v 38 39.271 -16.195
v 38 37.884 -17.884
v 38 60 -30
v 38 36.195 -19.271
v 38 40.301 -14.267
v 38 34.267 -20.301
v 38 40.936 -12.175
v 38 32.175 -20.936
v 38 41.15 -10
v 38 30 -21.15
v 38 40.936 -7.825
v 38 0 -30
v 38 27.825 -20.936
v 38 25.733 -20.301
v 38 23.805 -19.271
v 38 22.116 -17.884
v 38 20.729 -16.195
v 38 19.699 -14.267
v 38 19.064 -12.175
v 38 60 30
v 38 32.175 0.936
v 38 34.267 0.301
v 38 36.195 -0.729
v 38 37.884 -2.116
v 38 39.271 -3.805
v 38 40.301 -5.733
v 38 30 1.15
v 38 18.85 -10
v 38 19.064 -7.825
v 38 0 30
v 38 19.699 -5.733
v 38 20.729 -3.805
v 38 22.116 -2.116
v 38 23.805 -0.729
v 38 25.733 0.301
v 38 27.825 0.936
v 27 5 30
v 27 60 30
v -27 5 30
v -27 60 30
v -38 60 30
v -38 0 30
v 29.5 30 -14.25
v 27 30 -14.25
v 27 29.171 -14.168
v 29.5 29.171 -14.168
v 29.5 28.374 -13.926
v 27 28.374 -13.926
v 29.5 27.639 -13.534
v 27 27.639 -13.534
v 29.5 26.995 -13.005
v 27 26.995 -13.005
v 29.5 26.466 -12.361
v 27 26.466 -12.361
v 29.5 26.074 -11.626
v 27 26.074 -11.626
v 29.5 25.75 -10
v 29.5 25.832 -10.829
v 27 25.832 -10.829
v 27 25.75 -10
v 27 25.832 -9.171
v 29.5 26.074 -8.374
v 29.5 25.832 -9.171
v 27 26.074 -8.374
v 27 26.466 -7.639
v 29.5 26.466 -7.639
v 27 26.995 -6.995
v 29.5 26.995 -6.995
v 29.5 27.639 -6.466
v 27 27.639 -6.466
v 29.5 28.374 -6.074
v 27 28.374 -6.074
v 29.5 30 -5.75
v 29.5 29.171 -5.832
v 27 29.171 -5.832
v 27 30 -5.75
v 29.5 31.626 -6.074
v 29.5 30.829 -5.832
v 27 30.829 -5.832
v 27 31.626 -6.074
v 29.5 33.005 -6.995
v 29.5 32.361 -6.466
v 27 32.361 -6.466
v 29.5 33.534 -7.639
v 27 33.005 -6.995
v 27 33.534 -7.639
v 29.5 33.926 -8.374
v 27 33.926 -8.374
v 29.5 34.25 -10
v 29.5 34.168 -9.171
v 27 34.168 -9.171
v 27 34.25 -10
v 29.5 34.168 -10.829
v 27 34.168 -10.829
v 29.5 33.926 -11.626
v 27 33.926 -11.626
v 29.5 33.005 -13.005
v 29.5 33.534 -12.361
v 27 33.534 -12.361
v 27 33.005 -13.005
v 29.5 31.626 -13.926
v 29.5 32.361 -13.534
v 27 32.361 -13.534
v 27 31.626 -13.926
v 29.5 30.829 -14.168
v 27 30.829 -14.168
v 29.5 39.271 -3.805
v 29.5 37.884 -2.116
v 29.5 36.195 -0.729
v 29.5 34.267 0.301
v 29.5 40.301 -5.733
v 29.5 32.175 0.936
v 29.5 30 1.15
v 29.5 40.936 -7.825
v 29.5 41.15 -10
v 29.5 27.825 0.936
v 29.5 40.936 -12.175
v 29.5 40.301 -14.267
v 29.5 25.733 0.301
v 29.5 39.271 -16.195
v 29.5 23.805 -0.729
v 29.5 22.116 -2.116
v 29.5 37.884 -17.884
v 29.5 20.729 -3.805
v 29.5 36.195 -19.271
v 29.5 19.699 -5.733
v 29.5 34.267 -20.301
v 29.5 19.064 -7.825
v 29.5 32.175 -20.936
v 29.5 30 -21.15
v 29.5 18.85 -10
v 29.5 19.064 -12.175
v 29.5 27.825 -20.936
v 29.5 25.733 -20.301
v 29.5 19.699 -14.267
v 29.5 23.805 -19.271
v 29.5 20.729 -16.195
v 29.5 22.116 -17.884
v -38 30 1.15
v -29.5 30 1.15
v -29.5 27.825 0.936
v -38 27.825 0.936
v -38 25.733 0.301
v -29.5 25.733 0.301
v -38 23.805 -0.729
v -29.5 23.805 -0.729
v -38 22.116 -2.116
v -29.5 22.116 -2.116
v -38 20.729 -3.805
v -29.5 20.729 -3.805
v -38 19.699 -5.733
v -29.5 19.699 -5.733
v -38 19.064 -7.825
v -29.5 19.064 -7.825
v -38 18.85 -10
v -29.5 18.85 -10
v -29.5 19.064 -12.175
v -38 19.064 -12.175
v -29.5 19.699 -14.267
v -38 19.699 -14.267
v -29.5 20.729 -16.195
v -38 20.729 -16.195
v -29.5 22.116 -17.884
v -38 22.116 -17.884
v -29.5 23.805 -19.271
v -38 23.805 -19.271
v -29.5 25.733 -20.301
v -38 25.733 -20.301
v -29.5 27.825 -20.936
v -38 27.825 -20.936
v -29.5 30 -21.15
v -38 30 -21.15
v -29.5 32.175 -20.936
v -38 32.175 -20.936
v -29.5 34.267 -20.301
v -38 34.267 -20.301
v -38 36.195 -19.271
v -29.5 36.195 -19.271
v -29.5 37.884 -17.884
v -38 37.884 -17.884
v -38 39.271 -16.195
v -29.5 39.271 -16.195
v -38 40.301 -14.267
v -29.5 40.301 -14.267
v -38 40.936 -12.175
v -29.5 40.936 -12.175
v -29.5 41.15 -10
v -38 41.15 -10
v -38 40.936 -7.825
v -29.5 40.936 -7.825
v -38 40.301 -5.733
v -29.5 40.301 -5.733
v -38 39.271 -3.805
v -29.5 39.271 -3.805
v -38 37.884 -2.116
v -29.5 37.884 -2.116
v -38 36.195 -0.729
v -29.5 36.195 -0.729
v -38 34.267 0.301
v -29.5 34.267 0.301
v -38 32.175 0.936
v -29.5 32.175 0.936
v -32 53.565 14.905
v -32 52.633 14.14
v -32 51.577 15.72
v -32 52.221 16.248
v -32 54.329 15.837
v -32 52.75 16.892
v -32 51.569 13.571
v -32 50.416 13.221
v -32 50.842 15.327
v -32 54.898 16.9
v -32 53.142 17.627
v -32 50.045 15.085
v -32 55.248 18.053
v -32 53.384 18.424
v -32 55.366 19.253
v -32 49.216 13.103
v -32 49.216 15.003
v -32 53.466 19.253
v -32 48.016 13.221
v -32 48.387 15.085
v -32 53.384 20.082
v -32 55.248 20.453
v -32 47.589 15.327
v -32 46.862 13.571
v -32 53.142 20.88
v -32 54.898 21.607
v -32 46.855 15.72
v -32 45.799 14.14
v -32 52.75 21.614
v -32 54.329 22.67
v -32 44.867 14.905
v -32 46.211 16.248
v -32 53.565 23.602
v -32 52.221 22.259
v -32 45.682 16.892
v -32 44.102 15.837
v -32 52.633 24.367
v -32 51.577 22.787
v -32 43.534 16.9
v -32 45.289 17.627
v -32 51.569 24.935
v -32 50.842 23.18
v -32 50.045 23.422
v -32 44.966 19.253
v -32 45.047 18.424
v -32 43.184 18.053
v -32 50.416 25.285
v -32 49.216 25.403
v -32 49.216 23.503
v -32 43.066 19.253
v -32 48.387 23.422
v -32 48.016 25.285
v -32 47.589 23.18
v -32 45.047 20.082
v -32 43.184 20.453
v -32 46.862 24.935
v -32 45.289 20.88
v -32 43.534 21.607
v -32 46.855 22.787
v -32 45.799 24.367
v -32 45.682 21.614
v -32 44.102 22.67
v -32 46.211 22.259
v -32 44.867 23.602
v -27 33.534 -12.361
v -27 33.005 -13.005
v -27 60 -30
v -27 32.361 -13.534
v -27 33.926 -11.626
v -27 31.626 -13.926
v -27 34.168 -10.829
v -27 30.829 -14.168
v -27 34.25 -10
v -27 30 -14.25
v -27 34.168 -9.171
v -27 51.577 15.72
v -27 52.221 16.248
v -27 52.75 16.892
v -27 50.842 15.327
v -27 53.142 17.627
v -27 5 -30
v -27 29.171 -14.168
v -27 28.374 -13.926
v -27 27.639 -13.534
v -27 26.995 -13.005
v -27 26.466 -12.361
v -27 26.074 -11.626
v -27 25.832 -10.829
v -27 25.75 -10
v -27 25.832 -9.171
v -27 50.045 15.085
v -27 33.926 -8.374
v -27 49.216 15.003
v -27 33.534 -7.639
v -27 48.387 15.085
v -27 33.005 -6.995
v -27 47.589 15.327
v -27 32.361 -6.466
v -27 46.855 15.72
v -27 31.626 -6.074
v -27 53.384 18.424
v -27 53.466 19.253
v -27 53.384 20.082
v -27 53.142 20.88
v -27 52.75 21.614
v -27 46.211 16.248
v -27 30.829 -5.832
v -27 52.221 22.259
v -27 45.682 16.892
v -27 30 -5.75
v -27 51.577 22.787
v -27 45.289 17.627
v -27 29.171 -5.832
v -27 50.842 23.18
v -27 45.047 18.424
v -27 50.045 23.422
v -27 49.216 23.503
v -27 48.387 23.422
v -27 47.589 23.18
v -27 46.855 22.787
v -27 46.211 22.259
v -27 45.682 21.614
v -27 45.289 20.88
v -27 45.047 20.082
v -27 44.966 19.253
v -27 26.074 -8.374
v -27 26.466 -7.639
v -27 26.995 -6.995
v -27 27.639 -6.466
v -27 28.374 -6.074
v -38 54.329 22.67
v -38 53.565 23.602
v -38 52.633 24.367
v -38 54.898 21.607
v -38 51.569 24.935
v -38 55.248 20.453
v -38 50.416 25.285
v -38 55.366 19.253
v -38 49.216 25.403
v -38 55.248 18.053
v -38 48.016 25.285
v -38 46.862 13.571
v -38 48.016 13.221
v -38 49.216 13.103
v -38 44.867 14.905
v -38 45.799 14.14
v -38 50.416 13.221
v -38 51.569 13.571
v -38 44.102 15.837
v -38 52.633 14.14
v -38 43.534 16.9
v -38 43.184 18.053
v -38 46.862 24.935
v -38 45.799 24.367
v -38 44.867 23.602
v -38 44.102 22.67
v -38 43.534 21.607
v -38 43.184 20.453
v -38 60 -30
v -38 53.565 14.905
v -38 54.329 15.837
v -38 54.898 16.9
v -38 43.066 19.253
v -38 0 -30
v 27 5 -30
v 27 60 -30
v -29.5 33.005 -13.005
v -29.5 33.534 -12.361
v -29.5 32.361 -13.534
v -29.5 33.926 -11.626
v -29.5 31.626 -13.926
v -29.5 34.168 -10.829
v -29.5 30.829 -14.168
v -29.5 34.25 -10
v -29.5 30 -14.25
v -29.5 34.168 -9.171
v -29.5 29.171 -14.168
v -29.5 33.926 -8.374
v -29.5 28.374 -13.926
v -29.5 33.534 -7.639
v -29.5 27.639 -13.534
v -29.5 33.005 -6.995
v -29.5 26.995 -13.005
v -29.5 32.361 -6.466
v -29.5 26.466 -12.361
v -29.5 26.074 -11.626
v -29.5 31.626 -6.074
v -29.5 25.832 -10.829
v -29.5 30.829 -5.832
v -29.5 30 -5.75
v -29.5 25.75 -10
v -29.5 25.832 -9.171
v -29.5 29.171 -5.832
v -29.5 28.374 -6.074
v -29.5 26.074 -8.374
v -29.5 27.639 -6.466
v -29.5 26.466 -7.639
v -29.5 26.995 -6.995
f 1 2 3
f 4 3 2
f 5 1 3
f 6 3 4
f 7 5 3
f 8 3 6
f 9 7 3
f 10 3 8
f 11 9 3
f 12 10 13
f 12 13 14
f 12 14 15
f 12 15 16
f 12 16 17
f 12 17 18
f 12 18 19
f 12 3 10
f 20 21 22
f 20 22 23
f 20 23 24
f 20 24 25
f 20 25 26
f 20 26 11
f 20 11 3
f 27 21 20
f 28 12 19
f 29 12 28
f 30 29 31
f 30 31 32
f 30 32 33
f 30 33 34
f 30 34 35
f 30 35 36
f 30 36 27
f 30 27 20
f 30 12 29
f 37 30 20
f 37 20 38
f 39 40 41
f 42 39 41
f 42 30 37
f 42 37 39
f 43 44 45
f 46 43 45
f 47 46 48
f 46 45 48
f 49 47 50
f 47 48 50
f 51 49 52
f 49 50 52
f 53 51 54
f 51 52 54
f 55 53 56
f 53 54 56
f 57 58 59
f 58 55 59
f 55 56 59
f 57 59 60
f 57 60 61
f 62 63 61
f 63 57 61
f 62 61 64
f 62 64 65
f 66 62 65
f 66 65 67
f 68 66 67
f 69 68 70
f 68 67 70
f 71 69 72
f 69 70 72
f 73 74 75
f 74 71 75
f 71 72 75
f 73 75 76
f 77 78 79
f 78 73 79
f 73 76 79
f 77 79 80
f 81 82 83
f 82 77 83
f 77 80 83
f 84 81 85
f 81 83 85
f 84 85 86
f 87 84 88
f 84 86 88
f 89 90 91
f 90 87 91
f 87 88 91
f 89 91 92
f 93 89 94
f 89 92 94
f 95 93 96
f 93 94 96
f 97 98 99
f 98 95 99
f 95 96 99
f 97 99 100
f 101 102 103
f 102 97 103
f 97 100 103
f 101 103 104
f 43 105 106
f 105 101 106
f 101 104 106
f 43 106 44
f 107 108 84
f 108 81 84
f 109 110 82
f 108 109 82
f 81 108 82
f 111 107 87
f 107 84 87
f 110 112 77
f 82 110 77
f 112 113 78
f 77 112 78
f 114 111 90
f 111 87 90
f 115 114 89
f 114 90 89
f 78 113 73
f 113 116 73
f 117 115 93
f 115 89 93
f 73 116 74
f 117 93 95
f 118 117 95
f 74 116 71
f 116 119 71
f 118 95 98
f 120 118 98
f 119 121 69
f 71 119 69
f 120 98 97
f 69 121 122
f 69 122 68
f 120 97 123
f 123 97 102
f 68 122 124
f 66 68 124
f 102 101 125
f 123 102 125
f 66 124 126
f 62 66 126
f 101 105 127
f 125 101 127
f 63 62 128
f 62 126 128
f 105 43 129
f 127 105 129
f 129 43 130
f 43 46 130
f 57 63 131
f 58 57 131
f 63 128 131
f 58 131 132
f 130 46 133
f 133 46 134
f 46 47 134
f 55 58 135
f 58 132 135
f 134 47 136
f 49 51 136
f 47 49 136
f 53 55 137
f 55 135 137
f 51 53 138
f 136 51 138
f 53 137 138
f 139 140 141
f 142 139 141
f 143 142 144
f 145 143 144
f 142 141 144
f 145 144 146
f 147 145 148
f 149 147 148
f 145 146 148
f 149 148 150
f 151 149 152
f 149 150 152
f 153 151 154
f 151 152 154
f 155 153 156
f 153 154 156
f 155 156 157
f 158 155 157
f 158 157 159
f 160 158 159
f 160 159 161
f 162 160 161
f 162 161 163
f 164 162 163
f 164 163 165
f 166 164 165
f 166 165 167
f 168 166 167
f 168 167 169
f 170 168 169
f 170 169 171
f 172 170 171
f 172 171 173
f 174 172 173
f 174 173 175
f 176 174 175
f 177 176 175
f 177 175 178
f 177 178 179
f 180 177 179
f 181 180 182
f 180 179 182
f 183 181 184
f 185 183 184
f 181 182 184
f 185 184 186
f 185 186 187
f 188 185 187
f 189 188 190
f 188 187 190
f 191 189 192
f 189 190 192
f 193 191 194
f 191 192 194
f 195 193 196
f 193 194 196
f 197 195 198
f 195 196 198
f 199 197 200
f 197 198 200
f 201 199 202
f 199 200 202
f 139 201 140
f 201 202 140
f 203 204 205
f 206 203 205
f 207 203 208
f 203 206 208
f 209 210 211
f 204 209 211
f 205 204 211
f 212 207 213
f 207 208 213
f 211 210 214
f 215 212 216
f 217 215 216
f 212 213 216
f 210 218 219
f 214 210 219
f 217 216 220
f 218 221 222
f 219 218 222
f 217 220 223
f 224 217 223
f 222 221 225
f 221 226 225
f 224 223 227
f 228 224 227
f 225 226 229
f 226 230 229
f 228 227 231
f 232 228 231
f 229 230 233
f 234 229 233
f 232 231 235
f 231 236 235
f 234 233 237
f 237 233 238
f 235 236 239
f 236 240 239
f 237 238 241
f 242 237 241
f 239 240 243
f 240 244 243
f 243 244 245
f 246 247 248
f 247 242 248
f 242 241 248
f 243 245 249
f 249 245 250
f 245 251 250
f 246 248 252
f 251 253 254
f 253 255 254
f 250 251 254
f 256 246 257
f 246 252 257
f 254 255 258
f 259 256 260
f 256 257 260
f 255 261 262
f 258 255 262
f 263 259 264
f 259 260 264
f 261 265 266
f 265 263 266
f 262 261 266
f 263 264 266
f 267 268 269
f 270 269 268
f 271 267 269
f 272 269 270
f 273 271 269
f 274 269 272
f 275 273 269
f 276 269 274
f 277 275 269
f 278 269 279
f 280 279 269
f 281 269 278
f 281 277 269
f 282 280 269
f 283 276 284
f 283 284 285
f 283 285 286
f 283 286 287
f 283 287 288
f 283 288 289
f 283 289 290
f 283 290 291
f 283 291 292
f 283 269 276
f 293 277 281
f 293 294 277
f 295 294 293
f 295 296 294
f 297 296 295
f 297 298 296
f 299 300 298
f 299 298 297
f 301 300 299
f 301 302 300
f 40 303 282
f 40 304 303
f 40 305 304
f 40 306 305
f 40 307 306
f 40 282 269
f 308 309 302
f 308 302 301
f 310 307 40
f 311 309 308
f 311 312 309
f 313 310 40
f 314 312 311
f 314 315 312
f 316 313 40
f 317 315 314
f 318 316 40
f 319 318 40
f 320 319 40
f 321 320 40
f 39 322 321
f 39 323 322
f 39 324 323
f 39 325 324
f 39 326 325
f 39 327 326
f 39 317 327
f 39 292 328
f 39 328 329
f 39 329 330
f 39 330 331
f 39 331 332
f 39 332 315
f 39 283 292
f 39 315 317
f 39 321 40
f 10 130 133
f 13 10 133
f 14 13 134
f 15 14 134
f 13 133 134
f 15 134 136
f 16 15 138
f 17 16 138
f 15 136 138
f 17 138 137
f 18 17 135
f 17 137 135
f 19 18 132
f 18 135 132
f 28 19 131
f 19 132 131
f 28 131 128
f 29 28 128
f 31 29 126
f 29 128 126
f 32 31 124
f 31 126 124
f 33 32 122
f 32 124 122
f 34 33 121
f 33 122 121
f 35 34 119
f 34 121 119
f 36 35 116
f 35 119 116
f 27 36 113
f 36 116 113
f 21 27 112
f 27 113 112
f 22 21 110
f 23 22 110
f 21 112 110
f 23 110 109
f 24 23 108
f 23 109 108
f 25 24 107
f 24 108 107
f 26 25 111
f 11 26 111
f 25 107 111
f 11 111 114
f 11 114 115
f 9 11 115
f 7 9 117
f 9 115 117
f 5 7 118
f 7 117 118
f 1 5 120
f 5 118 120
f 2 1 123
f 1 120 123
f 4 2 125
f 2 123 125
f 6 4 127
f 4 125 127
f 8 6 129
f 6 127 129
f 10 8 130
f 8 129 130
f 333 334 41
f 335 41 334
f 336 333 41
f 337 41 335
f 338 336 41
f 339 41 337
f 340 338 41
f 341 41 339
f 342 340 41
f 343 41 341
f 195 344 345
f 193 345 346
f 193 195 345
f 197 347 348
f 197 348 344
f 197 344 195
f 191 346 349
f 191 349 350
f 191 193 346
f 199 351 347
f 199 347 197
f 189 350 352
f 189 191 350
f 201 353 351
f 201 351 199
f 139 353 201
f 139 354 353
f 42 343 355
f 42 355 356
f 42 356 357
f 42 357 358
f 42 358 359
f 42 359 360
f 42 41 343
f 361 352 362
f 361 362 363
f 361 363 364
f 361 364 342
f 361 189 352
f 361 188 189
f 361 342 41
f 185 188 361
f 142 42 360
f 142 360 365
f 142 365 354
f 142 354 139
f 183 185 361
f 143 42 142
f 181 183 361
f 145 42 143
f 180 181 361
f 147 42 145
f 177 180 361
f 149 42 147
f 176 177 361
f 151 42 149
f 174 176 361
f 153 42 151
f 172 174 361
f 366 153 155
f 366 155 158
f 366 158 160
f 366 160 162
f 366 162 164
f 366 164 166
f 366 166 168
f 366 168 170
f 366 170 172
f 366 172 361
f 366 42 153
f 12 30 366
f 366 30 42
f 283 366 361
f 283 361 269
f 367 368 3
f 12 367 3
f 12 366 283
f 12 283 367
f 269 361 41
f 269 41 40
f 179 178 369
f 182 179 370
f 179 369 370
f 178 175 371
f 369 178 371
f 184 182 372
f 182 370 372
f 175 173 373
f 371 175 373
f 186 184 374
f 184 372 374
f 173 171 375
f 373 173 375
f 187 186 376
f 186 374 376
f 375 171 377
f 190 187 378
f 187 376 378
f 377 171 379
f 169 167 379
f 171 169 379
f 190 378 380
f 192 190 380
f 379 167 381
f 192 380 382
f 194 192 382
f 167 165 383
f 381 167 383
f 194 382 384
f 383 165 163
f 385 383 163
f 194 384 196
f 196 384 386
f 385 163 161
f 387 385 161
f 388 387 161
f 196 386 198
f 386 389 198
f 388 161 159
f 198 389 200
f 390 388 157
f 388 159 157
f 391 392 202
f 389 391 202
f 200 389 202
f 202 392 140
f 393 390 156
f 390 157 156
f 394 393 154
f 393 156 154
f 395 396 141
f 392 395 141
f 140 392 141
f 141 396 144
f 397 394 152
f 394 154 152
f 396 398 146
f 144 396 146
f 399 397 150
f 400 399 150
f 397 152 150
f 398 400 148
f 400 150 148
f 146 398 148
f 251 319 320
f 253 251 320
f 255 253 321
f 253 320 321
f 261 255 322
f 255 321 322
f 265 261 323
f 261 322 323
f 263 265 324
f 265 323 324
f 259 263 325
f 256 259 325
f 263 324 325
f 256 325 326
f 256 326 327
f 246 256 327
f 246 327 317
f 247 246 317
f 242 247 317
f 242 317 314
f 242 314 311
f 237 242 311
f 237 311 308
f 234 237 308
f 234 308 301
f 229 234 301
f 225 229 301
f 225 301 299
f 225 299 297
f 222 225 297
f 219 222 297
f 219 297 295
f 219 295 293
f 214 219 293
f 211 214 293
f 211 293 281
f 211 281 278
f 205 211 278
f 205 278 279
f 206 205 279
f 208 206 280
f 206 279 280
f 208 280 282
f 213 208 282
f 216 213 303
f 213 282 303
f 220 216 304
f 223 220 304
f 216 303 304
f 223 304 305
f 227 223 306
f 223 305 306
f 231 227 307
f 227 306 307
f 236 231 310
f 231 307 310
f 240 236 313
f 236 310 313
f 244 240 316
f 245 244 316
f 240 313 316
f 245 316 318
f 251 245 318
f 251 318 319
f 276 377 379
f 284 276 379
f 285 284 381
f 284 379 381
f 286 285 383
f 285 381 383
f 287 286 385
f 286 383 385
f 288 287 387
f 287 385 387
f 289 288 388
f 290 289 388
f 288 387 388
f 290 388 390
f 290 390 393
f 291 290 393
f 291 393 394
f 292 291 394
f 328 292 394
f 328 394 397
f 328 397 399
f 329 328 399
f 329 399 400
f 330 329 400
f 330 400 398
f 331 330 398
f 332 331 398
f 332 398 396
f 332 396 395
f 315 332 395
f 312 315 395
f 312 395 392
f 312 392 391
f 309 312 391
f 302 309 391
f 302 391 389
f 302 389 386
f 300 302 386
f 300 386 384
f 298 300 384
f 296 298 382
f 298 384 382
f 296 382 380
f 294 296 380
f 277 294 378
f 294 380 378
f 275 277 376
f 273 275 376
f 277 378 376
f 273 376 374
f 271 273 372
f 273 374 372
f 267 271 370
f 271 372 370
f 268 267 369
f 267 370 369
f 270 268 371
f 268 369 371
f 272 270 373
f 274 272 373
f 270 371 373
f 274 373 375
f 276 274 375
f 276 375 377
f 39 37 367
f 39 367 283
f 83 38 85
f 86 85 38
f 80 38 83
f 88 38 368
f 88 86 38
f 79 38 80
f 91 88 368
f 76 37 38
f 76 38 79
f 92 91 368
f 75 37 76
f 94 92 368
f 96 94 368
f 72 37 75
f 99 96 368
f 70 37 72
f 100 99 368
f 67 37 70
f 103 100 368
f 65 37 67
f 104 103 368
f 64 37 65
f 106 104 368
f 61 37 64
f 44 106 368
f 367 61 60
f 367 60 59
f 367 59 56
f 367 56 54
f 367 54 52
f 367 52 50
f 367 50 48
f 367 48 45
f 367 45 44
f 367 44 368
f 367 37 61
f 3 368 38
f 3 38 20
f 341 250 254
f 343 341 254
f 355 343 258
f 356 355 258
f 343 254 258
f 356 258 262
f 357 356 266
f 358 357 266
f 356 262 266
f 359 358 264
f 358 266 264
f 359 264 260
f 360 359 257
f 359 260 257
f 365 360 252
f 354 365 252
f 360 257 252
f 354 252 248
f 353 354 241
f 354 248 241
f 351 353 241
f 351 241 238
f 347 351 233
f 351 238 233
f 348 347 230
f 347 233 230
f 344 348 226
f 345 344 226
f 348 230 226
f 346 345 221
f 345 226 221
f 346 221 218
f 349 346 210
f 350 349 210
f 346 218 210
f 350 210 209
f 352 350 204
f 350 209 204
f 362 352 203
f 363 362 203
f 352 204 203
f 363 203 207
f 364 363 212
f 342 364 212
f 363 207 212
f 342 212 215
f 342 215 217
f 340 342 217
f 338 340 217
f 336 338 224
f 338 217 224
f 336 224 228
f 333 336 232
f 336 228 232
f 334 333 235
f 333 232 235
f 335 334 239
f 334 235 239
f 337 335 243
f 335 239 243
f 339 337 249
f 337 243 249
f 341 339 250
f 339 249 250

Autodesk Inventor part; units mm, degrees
ref_plane "YZ Plane" through (0, 0, 0) normal (1, 0, 0) x (0, 1, 0)
ref_plane "XZ Plane" through (0, 0, 0) normal (0, 1, 0) x (-1, 0, 0)
ref_plane "XY Plane" through (0, 0, 0) normal (0, 0, 1) x (1, 0, 0)
sketch "草圖1" plane through (0, 0, 0) normal (0, 1, 0) x (-1, 0, 0)
  line L0 (-38, 30) -> (38, 30)
  line L1 (38, 30) -> (38, -30)
  line L2 (38, -30) -> (-38, -30)
  line L3 (-38, -30) -> (-38, 30)
  point P0 (0, 0)
  point P1 (0, -30)
  point P2 (38, 0)
  dimension "d0" = 60
  dimension "d1" = 76
extrude "擠出1" add sketch "草圖1" along normal blind 5
sketch "草圖2" plane through (0, 5, 0) normal (0, 1, 0) x (1, 0, 0)
  line L0 (38, 30) -> (-38, 30) projected
  line L1 (-38, 30) -> (-38, -30) projected
  line L2 (-38, -30) -> (38, -30) projected
  line L3 (38, -30) -> (38, 30) projected
  line L4 (-27, 30) -> (-27, -30)
  line L5 (27, -30) -> (27, 30)
  point P0 (0, 0)
  dimension "d4" = 11
  dimension "d5" = 11
extrude "擠出2" add sketch "草圖2" along normal blind 55 contours L3 L2 L5 L0 | L4 L2 L1 L0
sketch "草圖3" plane through (38, 0, 30) normal (1, 0, 0) x (0, 0, -1)
  line L0 (60, 0) -> (60, 60) projected
  line L1 (0, 5) -> (60, 5) projected
  circle A0 centre (40, 30) radius 11.2
  line L2 (10.7467, 49.2158) -> (40, 30)
  point P0 (30, 0)
  dimension "d8" = 22.4
  dimension "d9" = 25
  dimension "d10" = 20
  dimension "d25" = 35
  dimension "d26" = 33.3
sketch "草圖4" plane through (-38, 0, -30) normal (-1, 0, 0) x (0, 0, 1)
  line L0 (0, 0) -> (0, 60) projected
  line L1 (0, 5) -> (60, 5) projected
  circle A0 centre (20, 30) radius 11.2
  line L2 (20, 30) -> (49.2533, 49.2158)
  point P0 (30, 0)
  dimension "d13" = 22.4
  dimension "d14" = 25
  dimension "d15" = 20
  dimension "d41" = 35
  dimension "d42" = 33.3
hole "孔1" at (38, 30, -10) direction (-1, 0, 0) diameter 8.5 end through all counterbore diameter 22.3 counterbore depth 8.5
hole "孔2" at (-38, 30, -10) direction (1, 0, 0) diameter 8.5 end through all counterbore diameter 22.3 counterbore depth 8.5
hole "孔4" at (-38, 49.2158, 19.2533) direction (1, 0, 0) diameter 8.5 depth 11 counterbore diameter 12.3 counterbore depth 6
equation "\"d13\" = d8"
equation "\"d14\" = d9"
equation "\"d15\" = d10"
properties part number "Base"
